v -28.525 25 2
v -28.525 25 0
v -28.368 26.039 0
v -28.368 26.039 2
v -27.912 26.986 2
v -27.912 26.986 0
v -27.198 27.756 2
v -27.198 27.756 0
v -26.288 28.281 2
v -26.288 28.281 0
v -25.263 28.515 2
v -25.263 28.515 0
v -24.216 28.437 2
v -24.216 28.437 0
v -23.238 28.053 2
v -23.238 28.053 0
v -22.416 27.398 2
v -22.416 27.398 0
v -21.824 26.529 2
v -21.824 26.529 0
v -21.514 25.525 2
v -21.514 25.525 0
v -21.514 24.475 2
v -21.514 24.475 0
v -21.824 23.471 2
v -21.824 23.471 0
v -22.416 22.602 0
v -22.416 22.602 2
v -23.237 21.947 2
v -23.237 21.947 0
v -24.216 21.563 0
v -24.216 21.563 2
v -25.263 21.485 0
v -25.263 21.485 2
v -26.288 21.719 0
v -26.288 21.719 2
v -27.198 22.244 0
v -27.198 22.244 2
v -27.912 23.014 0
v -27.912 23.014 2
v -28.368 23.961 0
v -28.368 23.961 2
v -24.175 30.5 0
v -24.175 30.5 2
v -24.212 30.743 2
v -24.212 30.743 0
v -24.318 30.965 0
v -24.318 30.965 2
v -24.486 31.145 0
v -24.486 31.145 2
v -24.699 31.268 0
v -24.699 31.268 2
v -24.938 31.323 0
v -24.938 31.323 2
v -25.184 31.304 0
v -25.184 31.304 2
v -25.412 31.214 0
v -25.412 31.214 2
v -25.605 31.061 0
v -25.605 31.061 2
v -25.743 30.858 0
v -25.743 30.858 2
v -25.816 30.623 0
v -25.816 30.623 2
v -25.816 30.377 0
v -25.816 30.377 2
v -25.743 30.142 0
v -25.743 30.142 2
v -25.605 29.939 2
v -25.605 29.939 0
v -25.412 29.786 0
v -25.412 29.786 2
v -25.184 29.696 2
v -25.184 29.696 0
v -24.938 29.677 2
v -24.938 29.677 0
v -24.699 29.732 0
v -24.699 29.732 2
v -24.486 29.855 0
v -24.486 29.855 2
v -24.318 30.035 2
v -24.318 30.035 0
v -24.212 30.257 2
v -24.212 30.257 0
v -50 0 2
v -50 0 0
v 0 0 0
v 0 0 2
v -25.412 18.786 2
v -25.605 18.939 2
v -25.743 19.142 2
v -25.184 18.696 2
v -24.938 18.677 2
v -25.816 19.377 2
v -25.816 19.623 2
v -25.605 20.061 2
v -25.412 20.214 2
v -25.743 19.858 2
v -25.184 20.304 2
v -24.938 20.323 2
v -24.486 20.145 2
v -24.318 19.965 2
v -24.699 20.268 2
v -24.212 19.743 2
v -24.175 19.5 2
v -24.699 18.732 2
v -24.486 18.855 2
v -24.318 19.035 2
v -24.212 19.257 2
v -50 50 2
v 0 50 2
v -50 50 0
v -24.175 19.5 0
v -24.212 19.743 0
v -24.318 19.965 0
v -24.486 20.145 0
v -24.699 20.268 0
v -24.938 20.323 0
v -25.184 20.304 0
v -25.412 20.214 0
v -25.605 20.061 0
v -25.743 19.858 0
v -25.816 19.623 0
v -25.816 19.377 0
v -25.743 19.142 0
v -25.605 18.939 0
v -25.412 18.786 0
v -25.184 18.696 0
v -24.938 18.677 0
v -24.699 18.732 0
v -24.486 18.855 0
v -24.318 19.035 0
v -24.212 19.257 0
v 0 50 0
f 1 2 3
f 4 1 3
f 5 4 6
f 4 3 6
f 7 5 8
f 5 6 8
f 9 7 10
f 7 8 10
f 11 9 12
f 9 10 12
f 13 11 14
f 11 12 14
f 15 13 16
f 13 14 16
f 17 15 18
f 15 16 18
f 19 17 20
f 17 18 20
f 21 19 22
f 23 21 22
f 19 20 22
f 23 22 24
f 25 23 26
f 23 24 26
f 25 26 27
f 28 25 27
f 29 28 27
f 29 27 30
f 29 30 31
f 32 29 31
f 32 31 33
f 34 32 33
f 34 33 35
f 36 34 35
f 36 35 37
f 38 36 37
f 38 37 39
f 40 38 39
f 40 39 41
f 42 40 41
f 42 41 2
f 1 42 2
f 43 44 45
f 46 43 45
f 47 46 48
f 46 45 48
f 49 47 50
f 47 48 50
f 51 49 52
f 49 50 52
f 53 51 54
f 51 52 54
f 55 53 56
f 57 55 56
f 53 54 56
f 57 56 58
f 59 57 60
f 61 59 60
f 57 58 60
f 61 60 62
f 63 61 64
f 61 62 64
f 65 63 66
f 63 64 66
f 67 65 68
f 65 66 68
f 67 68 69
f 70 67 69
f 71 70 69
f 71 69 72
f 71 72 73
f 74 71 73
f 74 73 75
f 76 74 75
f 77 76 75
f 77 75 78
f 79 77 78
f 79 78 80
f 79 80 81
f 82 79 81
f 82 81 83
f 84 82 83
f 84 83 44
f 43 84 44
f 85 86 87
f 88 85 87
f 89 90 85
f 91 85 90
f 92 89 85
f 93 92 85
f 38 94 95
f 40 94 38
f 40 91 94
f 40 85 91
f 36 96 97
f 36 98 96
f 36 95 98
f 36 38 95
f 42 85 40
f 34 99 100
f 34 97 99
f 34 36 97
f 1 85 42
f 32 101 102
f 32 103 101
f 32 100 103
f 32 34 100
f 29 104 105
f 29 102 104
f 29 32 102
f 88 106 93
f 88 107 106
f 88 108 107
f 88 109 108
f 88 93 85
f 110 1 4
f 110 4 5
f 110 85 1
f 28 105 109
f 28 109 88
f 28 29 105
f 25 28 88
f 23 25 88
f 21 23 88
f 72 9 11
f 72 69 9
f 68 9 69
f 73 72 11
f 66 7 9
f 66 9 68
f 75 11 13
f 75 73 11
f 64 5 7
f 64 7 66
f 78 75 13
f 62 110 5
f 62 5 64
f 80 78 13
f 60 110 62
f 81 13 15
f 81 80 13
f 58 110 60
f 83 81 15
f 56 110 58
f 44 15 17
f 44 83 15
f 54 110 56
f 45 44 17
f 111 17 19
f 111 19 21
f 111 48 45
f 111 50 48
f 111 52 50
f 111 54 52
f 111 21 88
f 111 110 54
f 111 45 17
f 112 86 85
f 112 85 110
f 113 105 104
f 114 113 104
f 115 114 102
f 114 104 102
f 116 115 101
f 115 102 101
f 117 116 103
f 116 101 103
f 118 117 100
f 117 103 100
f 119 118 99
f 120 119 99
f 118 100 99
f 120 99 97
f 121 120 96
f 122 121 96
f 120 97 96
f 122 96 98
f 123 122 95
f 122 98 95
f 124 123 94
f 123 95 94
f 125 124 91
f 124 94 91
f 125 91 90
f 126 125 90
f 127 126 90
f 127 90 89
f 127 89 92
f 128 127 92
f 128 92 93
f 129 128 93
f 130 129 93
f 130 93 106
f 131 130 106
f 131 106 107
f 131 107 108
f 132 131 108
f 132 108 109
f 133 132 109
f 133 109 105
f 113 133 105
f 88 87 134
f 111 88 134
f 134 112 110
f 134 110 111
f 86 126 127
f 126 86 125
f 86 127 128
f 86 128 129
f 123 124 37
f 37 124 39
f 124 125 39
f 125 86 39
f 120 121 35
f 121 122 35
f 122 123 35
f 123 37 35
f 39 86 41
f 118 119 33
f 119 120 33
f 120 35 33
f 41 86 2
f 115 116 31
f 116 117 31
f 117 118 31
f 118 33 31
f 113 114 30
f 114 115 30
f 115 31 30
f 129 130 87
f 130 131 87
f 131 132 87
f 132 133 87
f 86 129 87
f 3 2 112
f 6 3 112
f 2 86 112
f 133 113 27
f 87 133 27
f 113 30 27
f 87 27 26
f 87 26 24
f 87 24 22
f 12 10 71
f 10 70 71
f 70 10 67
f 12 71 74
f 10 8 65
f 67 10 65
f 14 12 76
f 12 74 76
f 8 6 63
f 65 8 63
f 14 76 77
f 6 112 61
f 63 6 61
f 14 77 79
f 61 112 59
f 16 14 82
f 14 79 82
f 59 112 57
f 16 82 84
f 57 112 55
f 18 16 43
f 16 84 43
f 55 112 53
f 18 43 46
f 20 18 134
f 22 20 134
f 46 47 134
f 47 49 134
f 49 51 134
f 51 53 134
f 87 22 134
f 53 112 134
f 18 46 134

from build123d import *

# Parameters (mm, degrees)
SKETCH4_W           = 50
SKETCH4_H           = 50
BOSS_EXTRUDE2_DEPTH = 2
CUT_EXTRUDE1_REACH  = 72.739
SKETCH5_R           = 0.825
CUT_EXTRUDE2_REACH  = 72.739
SKETCH6_R           = 3.525


with BuildPart() as part:
    # Sketch4 → Boss-Extrude2 (new body)
    with BuildSketch(Plane.XY):
        with Locations((-25, 25)):
            Rectangle(SKETCH4_W, SKETCH4_H)
    extrude(amount=BOSS_EXTRUDE2_DEPTH)

    # Sketch5 → Cut-Extrude1 (cut, up to next)
    with BuildSketch(Plane.XY.offset(2), mode=Mode.PRIVATE) as cut_extrude1_sk1:
        with Locations((-25, 30.5)):
            Circle(SKETCH5_R)
    cut_extrude1_tool1 = extrude(cut_extrude1_sk1.sketch, amount=-CUT_EXTRUDE1_REACH, mode=Mode.PRIVATE) & part.part
    # Sketch5 → Cut-Extrude1 (cut, up to next)
    with BuildSketch(Plane.XY.offset(2), mode=Mode.PRIVATE) as cut_extrude1_sk2:
        with Locations((-25, 19.5)):
            Circle(SKETCH5_R)
    cut_extrude1_tool2 = extrude(cut_extrude1_sk2.sketch, amount=-CUT_EXTRUDE1_REACH, mode=Mode.PRIVATE) & part.part
    add(cut_extrude1_tool1.solids().sort_by_distance((-25, 30.5, 2))[0], mode=Mode.SUBTRACT)
    add(cut_extrude1_tool2.solids().sort_by_distance((-25, 19.5, 2))[0], mode=Mode.SUBTRACT)

    # Sketch6 → Cut-Extrude2 (cut, up to next)
    with BuildSketch(Plane(origin=(0, 0, 0), x_dir=(-1, 0, 0), z_dir=(0, 0, -1)), mode=Mode.PRIVATE) as cut_extrude2_sk1:
        with Locations((25, 25)):
            Circle(SKETCH6_R)
    cut_extrude2_tool1 = extrude(cut_extrude2_sk1.sketch, amount=-CUT_EXTRUDE2_REACH, mode=Mode.PRIVATE) & part.part
    add(cut_extrude2_tool1.solids().sort_by_distance((-25, 25, 0))[0], mode=Mode.SUBTRACT)


solid = part.part
